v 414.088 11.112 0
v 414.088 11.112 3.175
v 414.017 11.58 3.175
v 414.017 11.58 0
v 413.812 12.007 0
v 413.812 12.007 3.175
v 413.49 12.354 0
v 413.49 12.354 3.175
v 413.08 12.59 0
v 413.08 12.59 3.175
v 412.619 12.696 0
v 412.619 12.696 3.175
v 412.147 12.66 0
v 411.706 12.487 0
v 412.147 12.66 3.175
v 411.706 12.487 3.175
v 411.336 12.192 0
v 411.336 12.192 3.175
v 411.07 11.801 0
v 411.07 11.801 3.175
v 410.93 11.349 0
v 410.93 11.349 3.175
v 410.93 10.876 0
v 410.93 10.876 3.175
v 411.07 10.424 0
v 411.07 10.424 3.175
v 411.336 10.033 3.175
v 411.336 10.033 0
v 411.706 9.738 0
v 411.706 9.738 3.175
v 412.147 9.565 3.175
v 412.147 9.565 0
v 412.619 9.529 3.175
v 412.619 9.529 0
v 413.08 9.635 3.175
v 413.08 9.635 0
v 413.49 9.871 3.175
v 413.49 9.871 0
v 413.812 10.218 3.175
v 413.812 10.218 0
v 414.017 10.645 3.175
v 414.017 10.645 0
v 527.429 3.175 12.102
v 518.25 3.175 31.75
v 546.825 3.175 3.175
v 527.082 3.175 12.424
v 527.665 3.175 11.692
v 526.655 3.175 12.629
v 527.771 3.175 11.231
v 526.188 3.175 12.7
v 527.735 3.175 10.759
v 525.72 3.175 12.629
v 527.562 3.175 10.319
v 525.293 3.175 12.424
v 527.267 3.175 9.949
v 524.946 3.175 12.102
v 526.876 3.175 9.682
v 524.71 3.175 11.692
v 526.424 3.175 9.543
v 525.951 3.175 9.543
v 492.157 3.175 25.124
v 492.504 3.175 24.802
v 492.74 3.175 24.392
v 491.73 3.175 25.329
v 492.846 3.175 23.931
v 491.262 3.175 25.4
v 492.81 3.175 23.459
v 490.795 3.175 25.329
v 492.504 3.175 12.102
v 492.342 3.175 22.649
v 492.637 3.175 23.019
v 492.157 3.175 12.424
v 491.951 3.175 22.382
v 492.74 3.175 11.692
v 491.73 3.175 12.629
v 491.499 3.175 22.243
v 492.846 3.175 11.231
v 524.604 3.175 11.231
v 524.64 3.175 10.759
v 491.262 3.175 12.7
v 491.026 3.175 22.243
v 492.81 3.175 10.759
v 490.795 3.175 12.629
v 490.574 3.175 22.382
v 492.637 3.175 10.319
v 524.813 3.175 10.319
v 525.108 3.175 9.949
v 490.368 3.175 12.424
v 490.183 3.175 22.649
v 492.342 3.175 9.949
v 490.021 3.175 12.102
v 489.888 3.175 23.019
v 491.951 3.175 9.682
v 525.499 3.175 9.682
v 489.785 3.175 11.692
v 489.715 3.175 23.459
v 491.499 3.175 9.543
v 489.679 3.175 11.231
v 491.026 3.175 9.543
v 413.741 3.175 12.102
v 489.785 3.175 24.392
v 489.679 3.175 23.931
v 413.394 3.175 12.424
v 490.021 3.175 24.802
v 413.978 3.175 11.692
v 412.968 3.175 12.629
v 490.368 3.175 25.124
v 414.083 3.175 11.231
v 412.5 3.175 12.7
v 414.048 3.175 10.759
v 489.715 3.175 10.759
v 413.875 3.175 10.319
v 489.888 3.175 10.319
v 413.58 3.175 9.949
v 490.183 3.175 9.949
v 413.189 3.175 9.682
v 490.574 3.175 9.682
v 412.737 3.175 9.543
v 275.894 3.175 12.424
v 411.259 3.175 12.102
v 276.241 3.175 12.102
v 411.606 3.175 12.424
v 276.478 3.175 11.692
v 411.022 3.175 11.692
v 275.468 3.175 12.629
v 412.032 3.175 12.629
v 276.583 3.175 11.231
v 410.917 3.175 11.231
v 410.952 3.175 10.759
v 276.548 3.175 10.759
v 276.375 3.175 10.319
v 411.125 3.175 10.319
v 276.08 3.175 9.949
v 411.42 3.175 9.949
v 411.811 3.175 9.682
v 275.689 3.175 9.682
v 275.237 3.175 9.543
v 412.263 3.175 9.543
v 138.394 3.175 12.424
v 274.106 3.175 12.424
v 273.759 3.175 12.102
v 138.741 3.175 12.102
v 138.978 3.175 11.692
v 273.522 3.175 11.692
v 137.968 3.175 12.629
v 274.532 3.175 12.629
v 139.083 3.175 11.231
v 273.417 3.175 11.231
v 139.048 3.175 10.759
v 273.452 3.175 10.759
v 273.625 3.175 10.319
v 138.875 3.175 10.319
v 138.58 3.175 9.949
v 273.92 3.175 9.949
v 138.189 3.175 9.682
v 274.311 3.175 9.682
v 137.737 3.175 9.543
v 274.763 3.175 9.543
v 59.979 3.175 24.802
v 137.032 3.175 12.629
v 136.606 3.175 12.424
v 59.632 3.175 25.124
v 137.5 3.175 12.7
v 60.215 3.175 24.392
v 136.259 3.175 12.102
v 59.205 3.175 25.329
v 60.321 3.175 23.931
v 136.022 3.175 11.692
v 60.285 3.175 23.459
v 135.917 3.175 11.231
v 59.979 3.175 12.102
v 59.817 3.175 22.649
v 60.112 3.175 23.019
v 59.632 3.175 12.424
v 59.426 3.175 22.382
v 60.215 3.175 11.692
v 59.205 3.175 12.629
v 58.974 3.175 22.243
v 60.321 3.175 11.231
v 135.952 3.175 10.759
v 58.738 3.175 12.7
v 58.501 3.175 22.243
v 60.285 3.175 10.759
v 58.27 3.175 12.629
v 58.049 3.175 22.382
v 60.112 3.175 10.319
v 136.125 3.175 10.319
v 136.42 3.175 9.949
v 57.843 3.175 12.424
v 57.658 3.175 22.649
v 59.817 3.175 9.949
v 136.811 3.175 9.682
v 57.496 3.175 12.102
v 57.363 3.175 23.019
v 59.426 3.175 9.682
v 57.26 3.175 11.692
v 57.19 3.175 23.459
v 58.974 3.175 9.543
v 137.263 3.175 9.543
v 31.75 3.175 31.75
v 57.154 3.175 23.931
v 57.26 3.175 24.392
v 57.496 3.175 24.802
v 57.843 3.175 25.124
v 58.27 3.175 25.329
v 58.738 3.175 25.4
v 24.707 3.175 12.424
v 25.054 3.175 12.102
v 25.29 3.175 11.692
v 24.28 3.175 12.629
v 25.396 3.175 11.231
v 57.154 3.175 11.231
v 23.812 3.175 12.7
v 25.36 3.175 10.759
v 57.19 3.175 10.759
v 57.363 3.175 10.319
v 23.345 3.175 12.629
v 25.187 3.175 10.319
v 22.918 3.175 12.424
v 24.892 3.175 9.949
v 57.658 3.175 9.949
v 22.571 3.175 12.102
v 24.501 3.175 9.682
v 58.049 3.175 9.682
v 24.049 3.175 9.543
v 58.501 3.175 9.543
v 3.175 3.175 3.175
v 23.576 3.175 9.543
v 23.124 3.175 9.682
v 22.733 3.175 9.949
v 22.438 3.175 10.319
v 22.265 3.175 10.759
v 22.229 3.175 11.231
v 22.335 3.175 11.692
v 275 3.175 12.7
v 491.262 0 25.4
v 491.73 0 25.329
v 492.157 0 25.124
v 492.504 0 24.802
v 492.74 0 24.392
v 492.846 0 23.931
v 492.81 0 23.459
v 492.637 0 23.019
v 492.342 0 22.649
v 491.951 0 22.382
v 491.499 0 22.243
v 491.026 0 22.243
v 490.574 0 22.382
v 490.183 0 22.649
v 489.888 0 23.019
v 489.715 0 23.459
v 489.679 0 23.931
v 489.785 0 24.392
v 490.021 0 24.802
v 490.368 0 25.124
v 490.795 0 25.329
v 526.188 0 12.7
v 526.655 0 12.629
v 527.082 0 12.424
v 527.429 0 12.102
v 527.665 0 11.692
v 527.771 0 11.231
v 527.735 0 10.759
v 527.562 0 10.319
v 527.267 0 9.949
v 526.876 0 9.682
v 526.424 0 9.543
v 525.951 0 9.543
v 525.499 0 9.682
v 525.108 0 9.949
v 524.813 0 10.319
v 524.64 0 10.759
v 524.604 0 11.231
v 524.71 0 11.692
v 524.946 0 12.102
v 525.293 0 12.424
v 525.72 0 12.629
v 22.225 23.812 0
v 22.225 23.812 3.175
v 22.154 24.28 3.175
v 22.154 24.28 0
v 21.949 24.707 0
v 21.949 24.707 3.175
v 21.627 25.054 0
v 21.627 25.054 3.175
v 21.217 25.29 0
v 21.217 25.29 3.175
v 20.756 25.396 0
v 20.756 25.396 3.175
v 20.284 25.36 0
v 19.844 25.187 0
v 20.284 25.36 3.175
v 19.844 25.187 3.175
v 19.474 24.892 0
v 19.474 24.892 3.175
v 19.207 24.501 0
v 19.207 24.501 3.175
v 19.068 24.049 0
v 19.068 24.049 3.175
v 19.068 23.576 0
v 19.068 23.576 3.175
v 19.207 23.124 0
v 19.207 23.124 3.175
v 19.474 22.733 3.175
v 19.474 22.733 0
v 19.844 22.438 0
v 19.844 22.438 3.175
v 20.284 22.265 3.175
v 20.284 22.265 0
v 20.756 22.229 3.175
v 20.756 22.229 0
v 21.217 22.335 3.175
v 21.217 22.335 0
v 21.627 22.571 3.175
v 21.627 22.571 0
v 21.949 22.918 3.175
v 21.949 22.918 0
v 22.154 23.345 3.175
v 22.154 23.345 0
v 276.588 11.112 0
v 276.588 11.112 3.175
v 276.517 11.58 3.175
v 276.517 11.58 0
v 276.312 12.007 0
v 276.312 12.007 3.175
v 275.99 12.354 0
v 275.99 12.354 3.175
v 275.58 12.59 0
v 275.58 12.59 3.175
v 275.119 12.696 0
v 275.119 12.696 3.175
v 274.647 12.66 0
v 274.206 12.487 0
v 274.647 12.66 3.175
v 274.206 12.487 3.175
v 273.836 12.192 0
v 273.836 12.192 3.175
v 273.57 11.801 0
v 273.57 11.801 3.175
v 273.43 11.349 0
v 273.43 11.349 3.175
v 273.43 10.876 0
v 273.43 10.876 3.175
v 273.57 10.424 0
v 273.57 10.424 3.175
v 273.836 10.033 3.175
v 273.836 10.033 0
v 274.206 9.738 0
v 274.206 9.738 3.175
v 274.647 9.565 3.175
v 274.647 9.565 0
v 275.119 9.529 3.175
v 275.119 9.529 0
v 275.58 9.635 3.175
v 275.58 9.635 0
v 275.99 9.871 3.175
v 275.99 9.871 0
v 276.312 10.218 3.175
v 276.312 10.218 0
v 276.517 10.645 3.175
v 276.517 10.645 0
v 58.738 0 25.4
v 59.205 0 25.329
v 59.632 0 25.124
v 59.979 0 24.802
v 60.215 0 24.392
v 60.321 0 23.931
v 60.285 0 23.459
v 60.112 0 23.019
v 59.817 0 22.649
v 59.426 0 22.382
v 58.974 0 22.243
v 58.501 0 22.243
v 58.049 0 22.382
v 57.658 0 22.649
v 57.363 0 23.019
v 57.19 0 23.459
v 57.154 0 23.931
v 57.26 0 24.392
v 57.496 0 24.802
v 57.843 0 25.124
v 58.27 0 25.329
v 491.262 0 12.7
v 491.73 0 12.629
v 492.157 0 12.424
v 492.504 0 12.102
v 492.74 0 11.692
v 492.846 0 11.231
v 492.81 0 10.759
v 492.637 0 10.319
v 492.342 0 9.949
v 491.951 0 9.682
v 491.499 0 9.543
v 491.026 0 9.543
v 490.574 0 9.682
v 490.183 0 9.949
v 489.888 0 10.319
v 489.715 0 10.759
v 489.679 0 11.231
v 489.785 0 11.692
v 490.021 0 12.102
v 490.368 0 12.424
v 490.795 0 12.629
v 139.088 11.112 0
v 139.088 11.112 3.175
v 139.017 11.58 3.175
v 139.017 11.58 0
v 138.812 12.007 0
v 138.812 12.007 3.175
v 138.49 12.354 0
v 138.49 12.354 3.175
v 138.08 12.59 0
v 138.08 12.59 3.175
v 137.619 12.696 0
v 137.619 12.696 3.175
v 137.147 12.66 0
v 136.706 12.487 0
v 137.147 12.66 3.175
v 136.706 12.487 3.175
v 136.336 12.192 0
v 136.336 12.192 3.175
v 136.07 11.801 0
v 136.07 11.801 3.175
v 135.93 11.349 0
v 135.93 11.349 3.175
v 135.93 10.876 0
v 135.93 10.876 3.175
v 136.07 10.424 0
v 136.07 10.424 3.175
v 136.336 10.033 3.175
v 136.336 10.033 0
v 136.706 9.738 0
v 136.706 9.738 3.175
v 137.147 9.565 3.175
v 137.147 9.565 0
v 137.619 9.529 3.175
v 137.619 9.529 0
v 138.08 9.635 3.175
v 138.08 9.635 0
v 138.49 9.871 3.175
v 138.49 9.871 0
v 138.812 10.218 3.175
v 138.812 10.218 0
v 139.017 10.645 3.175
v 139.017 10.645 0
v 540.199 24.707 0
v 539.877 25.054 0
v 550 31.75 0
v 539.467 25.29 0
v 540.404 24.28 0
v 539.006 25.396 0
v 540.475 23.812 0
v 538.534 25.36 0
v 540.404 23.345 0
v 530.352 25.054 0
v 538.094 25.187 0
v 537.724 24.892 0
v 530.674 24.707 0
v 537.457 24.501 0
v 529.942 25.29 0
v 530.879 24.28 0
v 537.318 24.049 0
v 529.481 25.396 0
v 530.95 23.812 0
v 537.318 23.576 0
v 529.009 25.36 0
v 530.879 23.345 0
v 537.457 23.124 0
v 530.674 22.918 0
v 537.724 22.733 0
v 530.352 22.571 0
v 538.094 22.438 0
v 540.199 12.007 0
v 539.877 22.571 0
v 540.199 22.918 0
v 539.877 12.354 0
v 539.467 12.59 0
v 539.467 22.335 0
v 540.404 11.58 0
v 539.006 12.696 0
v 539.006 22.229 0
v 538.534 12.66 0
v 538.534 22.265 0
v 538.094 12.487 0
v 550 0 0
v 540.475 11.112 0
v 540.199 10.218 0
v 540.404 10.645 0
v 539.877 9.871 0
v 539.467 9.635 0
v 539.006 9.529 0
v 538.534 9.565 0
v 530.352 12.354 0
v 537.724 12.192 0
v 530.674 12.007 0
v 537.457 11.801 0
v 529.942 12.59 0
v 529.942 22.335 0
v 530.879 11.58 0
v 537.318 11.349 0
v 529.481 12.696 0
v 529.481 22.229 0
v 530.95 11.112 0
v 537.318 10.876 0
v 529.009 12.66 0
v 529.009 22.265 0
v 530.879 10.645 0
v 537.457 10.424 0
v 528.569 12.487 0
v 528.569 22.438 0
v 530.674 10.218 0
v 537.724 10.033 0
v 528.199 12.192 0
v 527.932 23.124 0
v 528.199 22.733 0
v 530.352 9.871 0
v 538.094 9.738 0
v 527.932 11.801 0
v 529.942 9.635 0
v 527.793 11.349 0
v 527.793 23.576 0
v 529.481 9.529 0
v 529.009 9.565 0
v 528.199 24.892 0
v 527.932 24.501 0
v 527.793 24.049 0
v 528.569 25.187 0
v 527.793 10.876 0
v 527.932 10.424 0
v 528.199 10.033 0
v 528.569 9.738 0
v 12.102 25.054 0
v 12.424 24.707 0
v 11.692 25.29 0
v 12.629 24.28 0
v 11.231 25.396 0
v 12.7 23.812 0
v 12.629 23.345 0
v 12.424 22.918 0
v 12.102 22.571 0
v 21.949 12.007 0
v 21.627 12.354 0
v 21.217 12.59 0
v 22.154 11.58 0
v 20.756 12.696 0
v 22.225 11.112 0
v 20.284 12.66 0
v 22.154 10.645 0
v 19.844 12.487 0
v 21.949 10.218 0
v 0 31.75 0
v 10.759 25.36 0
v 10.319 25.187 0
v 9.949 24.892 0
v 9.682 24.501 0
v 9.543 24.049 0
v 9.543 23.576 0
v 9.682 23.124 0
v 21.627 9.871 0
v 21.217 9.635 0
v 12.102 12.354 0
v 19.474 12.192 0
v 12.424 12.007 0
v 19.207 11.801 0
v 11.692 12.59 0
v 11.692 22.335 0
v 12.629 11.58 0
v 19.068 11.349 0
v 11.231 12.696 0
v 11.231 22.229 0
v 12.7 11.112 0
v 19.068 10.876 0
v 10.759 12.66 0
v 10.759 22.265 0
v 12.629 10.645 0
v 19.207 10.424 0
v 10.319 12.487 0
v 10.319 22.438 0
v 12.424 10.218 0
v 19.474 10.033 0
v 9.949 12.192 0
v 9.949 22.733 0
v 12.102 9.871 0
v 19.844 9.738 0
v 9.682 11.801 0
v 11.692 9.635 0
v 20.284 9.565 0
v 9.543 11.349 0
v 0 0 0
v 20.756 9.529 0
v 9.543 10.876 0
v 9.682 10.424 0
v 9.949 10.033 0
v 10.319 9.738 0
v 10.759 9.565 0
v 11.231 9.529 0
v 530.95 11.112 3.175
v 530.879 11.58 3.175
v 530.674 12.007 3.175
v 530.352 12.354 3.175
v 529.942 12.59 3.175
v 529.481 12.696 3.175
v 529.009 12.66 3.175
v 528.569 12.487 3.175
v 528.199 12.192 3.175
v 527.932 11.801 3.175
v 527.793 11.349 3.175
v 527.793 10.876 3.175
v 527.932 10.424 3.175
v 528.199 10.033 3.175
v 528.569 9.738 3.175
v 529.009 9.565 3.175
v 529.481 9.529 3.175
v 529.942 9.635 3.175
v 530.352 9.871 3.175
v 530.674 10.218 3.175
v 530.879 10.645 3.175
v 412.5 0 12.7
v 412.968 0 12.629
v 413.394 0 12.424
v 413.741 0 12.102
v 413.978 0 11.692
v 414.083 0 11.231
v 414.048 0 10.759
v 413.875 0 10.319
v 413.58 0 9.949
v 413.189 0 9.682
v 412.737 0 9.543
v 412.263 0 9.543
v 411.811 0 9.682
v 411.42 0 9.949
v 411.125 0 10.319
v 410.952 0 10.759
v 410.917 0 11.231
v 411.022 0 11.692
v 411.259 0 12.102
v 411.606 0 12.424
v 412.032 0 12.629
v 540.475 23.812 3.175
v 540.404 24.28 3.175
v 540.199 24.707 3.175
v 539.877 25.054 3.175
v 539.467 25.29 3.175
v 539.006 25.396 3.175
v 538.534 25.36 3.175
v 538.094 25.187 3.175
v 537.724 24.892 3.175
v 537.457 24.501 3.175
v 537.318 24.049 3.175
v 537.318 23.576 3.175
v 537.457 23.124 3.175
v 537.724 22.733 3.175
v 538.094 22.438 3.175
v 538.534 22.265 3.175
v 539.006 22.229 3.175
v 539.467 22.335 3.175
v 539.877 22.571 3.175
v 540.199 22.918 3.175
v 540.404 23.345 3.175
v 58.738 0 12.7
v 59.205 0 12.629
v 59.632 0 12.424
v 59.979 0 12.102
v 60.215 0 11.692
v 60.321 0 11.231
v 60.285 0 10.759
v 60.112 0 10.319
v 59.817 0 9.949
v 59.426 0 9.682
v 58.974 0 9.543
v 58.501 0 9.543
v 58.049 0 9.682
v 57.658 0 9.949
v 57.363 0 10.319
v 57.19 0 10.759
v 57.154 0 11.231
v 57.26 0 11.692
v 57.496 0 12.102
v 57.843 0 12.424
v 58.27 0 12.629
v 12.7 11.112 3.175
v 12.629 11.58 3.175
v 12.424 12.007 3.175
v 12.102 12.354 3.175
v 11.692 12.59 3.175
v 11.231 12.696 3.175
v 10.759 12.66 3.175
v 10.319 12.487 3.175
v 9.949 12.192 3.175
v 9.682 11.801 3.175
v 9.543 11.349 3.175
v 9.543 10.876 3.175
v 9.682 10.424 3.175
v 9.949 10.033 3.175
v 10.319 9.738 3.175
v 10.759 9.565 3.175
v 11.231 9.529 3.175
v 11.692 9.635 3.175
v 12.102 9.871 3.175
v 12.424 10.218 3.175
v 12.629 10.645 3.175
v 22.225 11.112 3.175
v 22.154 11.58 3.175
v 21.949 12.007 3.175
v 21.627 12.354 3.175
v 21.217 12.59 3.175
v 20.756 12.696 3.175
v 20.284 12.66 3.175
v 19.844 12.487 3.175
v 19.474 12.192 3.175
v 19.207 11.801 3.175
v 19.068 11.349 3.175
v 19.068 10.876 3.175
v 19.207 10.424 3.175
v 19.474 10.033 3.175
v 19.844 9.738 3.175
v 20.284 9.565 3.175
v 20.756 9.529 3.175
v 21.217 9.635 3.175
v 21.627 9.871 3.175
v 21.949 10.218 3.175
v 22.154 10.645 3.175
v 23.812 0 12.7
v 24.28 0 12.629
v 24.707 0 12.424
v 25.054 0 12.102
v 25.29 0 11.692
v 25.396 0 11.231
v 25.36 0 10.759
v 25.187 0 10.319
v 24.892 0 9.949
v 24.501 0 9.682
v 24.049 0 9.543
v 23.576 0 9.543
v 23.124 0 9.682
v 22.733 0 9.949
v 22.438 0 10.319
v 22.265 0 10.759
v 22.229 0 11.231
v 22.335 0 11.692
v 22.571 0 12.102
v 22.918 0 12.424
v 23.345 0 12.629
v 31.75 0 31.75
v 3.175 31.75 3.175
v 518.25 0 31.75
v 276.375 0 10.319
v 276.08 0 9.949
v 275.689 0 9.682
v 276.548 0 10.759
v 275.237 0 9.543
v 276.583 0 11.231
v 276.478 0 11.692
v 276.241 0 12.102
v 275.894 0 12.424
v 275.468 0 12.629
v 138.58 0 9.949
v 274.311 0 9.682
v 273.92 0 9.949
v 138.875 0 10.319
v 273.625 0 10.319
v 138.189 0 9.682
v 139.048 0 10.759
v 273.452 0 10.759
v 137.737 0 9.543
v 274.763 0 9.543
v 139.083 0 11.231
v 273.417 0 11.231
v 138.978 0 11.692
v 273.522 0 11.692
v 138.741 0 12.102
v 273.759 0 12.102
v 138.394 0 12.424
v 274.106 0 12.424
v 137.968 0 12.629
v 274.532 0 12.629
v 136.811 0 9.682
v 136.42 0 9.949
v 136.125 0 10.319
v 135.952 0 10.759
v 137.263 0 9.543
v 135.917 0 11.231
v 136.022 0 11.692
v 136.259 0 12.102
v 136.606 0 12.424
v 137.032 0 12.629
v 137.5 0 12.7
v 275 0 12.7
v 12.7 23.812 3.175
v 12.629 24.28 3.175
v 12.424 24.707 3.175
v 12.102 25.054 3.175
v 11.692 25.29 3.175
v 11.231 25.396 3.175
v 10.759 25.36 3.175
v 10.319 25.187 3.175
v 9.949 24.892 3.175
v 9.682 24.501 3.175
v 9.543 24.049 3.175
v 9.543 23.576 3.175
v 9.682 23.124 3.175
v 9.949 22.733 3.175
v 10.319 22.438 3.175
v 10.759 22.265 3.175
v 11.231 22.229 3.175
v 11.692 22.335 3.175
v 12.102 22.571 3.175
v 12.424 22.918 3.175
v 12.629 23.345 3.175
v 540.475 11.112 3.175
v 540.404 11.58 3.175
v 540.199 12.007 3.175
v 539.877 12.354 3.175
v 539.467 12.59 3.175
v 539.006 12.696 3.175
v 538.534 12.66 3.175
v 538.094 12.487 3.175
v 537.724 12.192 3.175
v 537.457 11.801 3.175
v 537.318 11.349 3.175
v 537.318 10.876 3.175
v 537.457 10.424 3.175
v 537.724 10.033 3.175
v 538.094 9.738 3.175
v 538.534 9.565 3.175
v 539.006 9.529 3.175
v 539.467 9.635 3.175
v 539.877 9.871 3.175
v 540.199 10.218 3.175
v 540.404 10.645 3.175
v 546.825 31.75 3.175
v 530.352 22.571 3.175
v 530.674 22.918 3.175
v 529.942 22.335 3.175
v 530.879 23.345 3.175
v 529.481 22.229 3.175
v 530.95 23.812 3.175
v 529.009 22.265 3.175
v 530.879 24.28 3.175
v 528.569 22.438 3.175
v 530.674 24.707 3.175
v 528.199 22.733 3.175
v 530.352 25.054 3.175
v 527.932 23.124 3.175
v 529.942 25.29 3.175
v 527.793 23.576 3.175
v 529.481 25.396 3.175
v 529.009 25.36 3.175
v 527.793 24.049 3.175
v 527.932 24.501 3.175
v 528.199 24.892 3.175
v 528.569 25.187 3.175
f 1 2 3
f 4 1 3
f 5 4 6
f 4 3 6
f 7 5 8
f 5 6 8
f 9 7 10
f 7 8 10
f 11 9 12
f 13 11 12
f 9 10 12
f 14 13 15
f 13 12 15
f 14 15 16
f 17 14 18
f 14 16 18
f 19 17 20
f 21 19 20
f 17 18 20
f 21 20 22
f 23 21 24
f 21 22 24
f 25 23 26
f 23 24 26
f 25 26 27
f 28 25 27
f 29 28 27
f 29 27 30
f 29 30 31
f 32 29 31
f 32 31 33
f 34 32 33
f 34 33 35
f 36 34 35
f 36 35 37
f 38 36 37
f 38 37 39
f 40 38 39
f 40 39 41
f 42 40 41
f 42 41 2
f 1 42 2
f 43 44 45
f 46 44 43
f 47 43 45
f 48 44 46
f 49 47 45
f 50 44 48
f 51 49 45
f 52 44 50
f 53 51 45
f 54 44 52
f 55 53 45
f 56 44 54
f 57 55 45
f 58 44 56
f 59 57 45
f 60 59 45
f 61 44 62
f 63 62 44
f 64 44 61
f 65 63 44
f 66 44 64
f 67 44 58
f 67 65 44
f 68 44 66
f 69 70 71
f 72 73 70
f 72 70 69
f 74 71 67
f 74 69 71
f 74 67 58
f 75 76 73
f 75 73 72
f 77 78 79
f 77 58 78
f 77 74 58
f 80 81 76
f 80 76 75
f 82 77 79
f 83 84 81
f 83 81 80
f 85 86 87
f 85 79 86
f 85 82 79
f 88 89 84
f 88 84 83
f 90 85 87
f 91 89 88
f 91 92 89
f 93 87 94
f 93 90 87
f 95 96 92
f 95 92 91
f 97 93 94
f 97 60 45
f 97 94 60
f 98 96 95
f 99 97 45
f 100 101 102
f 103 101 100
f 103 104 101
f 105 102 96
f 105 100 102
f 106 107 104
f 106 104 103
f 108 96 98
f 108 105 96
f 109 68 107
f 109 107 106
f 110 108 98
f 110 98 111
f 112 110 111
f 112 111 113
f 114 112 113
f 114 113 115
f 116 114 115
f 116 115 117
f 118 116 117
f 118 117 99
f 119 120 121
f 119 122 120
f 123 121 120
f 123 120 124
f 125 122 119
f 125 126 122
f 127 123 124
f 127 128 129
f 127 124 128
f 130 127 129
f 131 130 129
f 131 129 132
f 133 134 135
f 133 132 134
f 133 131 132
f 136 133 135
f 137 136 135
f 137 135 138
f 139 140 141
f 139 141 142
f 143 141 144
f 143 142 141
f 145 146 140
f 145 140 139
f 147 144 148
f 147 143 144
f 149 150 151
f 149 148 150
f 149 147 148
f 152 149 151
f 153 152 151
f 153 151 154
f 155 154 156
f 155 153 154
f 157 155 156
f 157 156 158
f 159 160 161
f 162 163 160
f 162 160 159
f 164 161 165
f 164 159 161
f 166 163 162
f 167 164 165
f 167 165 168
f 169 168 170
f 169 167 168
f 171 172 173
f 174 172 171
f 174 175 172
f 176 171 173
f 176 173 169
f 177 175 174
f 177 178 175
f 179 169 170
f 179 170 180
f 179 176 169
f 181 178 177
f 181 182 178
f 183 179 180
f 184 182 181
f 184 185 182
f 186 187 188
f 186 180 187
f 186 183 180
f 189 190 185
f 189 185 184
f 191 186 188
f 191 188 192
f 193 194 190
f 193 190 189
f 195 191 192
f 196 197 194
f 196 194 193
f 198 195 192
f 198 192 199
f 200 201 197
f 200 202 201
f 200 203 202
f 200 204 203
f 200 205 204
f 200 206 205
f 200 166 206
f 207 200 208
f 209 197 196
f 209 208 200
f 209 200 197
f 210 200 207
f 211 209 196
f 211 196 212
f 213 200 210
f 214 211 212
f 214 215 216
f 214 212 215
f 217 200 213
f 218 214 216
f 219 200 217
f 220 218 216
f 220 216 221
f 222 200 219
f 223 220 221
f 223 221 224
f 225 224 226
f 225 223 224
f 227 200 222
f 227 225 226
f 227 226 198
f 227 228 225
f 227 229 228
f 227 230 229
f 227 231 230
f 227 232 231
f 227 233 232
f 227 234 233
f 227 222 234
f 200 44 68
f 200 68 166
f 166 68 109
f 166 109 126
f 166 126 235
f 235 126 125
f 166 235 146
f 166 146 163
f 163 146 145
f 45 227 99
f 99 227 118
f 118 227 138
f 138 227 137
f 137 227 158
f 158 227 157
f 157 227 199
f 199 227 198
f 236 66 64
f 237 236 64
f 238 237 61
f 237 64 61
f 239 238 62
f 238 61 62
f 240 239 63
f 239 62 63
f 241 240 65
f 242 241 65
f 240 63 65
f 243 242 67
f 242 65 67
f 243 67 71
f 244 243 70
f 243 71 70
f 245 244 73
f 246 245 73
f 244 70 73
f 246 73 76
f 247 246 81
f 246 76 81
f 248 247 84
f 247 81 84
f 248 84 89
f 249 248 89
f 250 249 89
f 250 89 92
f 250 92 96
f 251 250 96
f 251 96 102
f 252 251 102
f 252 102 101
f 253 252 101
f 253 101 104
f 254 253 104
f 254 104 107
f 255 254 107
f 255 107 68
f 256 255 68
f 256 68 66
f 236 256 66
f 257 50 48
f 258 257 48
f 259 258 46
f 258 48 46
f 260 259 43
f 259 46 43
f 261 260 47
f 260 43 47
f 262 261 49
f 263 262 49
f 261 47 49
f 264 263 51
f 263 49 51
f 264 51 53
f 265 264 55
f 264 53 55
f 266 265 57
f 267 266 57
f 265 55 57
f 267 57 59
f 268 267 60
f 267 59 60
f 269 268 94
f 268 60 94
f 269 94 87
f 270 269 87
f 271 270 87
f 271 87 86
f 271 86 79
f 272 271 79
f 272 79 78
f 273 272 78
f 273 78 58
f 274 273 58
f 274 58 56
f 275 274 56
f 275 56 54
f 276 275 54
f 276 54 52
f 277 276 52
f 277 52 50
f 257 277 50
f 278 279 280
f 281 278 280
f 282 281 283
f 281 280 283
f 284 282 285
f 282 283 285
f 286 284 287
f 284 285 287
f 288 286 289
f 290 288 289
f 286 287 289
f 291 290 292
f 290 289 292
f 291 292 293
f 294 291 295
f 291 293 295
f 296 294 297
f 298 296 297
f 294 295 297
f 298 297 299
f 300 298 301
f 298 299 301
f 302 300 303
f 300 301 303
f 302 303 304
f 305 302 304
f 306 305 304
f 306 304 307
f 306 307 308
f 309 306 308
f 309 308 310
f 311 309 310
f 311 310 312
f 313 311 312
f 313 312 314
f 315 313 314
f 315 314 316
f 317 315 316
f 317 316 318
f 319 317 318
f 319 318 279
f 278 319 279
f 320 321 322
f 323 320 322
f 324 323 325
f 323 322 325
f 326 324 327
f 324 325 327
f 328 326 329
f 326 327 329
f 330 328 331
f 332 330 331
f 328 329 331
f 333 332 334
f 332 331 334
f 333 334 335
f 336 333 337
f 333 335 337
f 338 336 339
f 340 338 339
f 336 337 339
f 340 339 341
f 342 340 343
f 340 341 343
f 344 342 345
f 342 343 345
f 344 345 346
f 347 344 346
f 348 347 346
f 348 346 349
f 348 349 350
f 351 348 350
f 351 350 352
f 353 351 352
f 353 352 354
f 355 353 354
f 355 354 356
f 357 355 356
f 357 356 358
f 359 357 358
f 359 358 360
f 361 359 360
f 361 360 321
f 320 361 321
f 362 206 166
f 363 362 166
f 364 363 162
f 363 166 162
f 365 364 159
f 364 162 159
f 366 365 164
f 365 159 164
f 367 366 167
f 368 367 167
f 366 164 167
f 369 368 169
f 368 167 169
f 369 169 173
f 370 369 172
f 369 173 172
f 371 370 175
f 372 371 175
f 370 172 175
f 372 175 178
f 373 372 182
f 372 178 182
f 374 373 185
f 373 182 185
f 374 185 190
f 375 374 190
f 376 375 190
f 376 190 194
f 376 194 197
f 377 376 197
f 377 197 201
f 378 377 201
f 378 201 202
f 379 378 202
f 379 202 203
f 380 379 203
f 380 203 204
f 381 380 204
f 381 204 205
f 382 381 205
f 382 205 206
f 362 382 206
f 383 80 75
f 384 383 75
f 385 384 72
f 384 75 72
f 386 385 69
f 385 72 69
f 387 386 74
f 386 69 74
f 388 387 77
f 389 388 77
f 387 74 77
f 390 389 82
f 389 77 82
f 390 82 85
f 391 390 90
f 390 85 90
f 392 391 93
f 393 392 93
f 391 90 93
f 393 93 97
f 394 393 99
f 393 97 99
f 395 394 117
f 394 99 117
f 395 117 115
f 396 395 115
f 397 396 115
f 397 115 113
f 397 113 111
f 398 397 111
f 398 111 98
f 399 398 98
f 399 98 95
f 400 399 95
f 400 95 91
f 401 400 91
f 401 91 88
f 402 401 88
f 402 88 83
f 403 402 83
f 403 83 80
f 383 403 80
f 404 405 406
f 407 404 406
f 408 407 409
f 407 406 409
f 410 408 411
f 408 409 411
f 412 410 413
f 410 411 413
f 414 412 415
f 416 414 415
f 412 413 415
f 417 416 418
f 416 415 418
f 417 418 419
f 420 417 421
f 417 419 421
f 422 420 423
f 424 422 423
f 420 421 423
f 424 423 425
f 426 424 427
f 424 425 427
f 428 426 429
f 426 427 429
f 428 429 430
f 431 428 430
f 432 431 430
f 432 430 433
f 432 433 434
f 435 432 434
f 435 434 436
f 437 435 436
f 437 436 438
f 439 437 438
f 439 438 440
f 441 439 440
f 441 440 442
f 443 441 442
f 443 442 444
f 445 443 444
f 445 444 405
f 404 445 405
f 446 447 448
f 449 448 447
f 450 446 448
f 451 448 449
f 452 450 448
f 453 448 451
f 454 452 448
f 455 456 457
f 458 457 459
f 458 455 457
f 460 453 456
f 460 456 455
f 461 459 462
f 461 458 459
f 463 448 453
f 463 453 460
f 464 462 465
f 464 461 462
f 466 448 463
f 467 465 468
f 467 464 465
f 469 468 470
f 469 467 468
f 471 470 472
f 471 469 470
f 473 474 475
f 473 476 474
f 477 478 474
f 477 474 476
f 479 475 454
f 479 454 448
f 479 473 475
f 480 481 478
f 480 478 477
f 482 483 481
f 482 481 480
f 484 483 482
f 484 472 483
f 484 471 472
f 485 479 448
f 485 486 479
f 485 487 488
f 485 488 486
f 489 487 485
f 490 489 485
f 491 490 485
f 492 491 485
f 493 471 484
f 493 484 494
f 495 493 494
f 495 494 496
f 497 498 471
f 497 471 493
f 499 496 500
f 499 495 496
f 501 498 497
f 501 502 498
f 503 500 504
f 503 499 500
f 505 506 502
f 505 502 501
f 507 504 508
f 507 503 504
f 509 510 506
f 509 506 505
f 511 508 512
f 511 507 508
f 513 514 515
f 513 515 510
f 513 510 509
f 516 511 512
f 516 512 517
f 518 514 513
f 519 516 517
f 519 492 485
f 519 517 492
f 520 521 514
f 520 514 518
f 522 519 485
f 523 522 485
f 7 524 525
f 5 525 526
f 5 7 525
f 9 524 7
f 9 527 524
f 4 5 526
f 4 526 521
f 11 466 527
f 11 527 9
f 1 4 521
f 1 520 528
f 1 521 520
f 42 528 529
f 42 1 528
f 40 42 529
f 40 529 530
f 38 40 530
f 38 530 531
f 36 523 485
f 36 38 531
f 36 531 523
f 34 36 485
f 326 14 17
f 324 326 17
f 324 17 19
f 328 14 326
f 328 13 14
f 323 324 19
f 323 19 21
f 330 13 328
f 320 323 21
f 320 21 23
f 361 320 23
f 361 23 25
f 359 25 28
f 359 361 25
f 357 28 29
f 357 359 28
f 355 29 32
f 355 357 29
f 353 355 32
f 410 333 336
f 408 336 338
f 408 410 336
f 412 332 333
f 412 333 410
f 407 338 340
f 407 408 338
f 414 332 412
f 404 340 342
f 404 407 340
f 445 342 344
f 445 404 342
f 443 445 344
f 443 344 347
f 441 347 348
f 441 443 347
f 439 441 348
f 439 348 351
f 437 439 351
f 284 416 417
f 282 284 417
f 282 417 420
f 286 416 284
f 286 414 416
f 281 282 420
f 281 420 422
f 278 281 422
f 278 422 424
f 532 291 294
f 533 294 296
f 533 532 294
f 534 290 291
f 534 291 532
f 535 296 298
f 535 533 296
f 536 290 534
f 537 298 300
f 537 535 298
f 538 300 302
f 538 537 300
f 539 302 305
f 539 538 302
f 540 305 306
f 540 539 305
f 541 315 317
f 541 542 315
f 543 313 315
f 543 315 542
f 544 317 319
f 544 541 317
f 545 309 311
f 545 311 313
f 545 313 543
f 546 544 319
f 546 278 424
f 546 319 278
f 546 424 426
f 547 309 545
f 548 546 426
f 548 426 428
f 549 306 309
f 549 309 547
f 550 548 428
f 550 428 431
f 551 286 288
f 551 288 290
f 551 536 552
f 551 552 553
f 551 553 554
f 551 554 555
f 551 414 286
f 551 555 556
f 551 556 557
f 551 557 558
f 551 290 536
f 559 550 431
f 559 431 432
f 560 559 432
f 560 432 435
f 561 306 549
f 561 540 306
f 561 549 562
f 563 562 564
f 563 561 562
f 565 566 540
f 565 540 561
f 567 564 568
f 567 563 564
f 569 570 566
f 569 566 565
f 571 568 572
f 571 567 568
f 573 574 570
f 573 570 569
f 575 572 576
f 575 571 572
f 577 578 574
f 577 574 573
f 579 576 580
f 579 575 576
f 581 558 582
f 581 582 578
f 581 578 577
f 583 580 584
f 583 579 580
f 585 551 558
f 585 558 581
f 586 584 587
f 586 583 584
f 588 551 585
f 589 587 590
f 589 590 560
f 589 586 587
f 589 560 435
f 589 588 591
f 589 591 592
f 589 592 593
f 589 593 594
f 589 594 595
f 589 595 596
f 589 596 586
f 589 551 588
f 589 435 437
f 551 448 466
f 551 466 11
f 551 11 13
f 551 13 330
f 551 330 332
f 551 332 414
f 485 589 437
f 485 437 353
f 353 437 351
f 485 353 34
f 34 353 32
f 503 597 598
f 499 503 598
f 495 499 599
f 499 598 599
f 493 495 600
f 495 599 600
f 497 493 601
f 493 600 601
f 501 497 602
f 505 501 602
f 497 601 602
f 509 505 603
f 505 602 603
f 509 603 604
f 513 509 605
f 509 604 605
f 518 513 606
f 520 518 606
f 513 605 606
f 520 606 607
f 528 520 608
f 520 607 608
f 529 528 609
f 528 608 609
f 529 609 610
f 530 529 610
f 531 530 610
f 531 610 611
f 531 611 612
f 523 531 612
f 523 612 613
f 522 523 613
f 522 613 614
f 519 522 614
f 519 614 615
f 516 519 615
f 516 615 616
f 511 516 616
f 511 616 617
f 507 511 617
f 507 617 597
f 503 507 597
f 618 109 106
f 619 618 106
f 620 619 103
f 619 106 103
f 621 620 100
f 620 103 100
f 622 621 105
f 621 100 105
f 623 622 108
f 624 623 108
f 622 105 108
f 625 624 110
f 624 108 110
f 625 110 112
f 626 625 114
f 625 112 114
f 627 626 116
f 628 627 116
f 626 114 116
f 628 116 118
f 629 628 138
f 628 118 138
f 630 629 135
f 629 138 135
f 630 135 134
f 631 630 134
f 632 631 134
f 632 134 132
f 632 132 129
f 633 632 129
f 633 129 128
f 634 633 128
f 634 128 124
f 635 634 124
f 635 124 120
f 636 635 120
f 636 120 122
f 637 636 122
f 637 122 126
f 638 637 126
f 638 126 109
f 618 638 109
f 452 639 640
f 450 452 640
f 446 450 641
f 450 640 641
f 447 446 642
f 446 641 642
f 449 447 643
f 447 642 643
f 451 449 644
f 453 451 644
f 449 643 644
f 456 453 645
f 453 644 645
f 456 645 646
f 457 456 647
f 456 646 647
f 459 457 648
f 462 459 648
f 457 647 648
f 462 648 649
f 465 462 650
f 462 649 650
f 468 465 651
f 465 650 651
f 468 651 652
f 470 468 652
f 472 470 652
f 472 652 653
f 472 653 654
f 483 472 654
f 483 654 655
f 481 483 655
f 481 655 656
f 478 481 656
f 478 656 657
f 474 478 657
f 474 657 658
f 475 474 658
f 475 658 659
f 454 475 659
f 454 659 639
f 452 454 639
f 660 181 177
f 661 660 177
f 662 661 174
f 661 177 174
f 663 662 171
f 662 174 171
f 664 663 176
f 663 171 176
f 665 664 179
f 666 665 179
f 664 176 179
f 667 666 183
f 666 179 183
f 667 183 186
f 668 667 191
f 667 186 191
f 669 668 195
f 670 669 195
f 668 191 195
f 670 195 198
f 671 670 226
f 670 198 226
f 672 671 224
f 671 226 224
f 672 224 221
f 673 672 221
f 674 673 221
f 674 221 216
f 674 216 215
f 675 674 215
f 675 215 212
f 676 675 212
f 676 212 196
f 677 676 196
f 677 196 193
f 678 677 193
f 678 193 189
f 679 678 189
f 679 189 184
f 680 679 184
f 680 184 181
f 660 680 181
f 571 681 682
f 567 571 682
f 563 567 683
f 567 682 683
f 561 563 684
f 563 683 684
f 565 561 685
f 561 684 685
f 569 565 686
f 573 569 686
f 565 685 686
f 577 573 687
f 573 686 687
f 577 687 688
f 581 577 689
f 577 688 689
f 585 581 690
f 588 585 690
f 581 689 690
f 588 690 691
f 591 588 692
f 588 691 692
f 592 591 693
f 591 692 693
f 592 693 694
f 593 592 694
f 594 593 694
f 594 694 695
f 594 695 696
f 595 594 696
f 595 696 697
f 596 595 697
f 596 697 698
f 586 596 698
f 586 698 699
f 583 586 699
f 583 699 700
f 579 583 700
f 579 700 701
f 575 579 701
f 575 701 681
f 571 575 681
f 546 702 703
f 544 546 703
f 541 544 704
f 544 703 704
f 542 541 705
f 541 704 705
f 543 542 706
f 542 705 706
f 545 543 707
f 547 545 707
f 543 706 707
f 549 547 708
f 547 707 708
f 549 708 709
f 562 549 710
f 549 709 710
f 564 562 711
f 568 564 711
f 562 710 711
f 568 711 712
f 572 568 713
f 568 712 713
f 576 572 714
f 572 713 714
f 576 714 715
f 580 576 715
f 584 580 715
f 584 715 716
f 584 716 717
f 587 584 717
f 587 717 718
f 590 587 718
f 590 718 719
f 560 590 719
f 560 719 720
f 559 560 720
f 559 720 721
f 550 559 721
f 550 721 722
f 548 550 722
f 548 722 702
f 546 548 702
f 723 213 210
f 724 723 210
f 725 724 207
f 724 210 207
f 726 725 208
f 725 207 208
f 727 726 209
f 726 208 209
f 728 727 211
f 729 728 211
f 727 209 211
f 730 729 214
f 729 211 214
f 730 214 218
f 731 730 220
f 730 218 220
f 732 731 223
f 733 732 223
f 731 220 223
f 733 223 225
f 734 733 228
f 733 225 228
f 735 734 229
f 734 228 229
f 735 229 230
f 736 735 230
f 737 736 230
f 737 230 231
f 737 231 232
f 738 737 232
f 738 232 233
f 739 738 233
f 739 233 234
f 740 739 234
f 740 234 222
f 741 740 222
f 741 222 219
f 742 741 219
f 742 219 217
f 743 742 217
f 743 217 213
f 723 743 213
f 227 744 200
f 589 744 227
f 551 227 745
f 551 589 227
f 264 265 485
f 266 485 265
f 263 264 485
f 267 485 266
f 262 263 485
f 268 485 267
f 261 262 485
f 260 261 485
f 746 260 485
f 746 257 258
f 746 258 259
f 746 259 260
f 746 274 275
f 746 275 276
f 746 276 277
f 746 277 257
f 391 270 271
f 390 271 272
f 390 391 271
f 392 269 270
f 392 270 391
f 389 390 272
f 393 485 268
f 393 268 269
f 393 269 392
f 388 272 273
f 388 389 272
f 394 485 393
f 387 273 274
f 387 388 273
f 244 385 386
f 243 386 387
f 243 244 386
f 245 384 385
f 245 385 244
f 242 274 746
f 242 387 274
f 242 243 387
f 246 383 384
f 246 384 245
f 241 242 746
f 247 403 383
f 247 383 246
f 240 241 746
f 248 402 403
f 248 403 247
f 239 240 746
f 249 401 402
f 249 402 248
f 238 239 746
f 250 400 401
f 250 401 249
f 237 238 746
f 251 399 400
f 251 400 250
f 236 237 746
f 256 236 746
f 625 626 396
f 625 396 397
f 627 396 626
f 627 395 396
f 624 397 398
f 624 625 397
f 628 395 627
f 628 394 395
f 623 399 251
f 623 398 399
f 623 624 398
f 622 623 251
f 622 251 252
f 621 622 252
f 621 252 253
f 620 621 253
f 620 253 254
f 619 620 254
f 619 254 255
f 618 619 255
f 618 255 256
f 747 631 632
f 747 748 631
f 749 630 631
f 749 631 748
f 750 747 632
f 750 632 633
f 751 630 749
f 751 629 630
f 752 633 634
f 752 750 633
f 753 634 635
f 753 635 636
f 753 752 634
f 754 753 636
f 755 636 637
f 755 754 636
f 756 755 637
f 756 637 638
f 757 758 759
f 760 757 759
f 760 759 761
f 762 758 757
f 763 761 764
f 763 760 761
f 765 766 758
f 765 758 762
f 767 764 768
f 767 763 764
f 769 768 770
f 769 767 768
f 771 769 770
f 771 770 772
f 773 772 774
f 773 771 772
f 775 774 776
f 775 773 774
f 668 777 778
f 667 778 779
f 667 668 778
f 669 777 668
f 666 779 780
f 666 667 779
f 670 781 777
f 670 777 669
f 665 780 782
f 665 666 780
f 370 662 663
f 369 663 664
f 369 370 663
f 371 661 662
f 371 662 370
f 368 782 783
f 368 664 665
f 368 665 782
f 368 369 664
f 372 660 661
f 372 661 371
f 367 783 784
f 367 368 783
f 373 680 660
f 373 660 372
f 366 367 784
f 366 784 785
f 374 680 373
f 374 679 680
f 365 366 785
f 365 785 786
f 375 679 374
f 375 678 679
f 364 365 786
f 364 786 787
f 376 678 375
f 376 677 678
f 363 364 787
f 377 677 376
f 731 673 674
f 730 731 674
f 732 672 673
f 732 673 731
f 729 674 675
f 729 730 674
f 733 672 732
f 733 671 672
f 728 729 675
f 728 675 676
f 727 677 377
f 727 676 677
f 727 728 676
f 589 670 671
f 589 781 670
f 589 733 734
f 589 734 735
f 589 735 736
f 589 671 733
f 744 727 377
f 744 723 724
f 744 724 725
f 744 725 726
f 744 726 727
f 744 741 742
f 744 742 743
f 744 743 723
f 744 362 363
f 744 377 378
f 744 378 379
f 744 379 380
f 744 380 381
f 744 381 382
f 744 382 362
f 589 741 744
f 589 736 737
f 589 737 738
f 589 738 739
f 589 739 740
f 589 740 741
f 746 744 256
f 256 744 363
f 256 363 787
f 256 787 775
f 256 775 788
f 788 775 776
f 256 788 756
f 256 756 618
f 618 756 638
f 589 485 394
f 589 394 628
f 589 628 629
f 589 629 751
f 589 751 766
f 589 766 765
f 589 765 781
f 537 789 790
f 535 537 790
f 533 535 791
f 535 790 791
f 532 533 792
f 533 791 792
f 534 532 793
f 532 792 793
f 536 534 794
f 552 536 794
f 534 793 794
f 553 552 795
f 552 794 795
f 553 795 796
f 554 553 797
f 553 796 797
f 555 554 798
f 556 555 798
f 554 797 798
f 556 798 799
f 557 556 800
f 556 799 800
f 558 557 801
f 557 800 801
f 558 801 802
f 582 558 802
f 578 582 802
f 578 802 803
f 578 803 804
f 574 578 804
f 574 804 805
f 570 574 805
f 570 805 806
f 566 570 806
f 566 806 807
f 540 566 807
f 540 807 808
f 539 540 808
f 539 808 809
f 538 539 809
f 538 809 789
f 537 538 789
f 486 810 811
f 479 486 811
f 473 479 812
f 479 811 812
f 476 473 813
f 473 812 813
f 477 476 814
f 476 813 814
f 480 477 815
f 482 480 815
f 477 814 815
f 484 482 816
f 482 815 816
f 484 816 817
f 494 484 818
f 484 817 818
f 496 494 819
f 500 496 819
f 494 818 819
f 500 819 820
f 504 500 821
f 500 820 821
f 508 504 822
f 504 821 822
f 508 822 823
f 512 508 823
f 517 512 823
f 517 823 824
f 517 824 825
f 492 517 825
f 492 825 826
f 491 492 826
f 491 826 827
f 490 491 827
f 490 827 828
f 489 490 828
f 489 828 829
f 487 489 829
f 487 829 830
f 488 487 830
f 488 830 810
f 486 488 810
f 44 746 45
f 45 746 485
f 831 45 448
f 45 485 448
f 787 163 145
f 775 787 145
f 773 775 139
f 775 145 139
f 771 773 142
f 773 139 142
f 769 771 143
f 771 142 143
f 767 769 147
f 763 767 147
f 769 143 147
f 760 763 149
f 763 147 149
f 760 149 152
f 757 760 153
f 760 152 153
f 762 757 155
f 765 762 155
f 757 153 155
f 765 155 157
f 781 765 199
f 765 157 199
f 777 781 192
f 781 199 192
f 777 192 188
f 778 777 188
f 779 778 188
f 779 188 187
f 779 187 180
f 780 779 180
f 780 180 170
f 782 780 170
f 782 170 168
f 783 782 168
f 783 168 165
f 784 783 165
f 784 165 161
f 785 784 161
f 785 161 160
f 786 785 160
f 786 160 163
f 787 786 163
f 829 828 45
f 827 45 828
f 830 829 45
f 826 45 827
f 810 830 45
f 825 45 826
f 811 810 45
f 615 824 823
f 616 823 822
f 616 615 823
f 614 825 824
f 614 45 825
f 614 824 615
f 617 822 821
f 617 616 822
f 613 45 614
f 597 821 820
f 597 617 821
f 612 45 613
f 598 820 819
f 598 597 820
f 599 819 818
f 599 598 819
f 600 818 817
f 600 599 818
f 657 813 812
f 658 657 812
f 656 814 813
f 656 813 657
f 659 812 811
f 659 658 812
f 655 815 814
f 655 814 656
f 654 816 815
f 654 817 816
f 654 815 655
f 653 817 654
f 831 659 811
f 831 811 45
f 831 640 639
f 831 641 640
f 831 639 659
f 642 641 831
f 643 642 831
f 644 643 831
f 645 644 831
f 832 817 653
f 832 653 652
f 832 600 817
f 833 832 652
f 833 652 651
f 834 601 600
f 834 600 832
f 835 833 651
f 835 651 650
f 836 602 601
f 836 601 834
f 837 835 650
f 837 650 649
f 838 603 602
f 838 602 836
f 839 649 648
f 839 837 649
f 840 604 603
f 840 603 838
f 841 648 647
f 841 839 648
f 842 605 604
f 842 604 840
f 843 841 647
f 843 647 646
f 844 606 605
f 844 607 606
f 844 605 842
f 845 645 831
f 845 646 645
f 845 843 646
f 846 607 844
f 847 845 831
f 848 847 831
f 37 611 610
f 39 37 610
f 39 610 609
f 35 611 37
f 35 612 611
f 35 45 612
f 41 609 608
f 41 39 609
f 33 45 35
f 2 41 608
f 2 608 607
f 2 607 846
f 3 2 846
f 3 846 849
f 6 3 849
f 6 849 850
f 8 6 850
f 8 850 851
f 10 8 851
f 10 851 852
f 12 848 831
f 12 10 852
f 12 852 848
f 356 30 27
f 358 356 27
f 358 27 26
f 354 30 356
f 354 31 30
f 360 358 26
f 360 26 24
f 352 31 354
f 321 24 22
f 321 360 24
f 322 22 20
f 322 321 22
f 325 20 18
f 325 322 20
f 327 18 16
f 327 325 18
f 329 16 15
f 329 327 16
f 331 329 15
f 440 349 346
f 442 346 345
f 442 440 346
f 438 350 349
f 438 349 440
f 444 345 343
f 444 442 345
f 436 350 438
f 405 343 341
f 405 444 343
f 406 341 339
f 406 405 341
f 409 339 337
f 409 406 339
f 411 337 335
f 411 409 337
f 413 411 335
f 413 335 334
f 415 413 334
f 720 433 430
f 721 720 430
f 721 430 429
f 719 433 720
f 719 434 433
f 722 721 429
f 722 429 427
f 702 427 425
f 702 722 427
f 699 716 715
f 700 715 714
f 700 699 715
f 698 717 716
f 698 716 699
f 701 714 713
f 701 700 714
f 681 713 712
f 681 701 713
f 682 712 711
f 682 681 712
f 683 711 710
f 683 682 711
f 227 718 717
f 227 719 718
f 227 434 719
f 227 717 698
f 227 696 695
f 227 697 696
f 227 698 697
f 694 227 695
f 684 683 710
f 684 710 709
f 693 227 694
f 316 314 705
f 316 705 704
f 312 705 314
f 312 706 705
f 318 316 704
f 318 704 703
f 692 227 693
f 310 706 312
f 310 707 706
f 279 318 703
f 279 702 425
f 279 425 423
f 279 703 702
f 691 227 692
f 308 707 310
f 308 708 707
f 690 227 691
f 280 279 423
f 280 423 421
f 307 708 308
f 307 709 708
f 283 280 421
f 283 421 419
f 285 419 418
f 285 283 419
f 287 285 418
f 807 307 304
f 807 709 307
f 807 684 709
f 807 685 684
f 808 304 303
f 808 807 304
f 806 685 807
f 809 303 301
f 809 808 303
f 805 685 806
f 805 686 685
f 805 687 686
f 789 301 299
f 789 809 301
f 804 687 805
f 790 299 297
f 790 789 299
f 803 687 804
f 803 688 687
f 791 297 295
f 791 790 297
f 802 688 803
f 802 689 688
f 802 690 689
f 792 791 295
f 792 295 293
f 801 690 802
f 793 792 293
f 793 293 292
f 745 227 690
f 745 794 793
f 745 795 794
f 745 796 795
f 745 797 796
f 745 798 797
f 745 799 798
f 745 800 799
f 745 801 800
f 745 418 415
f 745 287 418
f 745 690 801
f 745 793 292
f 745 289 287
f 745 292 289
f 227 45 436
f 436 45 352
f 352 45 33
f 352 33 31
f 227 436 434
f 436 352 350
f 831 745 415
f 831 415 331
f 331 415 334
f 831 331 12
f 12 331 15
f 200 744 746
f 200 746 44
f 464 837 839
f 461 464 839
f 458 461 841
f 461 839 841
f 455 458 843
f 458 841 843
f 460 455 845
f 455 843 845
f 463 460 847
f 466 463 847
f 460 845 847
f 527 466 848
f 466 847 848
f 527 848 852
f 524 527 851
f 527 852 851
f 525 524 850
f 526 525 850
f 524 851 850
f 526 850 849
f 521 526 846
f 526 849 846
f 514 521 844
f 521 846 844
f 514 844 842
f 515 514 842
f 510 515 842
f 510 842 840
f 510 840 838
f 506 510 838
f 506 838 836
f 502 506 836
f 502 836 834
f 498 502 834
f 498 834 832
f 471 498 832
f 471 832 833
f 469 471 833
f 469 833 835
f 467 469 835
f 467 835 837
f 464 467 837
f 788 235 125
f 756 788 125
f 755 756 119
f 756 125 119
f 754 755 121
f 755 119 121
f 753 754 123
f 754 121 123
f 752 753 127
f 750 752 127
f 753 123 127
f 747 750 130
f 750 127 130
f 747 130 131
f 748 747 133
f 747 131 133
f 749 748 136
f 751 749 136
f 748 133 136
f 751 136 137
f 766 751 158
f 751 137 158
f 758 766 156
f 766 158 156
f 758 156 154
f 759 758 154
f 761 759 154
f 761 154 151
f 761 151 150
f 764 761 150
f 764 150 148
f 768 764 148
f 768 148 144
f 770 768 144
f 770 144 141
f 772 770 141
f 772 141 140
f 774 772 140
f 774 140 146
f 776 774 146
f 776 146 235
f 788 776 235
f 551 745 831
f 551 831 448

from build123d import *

# Parameters (mm, degrees)
BOSS_EXTRUDE1_DEPTH          = 550
CHAMFER6_SIZE                = 31.75
CHAMFER7_SIZE                = 31.75
TOPHOLES_SKETCH3_R           = 1.5875
TOPHOLES_CUT_EXTRUDE2_DEPTH  = 552.656227306
SIDEHOLES_SKETCH4_R          = 1.5875
SIDEHOLES_CUT_EXTRUDE3_DEPTH = 552.656227306


with BuildPart() as part:
    # Sketch1 → Boss-Extrude1 (new body)
    with BuildSketch(Plane(origin=(0, 0, 0), x_dir=(0, 0, -1), z_dir=(1, 0, 0))):
        Polygon((0, 0), (-31.75, 0), (-31.75, 3.175), (-3.175, 3.175), (-3.175, 31.75), (0, 31.75), align=None)
    extrude(amount=BOSS_EXTRUDE1_DEPTH)

    # Chamfer6
    chamfer6_edges = [part.edges().sort_by_distance(p)[0] for p in [
        (550, 1.5875, 31.75),
    ]]
    chamfer(chamfer6_edges, length=CHAMFER6_SIZE - 0.0001)  # a hair under: the kernel refuses the full size

    # Chamfer7
    chamfer7_edges = [part.edges().sort_by_distance(p)[0] for p in [
        (0, 1.5875, 31.75),
    ]]
    chamfer(chamfer7_edges, length=CHAMFER7_SIZE - 0.0001)  # a hair under: the kernel refuses the full size

    # TopHoles-Sketch3 → TopHoles-Cut-Extrude2 (cut, through all)
    with BuildSketch(Plane(origin=(0, 3.175, 0), x_dir=(1, 0, 0), z_dir=(0, 1, 0))):
        with Locations(Location((58.7375, -23.8125, 0), (0, 0, 270))):
            Circle(TOPHOLES_SKETCH3_R)
        with Locations(Location((491.2625, -23.8125, 0), (0, 0, 270))):
            Circle(TOPHOLES_SKETCH3_R)
        with Locations(Location((491.2625, -11.1125, 0), (0, 0, 270))):
            Circle(TOPHOLES_SKETCH3_R)
        with Locations(Location((58.7375, -11.1125, 0), (0, 0, 270))):
            Circle(TOPHOLES_SKETCH3_R)
        with Locations(Location((526.1875, -11.1125, 0), (0, 0, 270))):
            Circle(TOPHOLES_SKETCH3_R)
        with Locations(Location((23.8125, -11.1125, 0), (0, 0, 270))):
            Circle(TOPHOLES_SKETCH3_R)
        with Locations(Location((275, -11.1125, 0), (0, 0, 270))):
            Circle(TOPHOLES_SKETCH3_R)
        with Locations(Location((137.5, -11.1125, 0), (0, 0, 270))):
            Circle(TOPHOLES_SKETCH3_R)
        with Locations(Location((412.5, -11.1125, 0), (0, 0, 270))):
            Circle(TOPHOLES_SKETCH3_R)
    extrude(amount=-TOPHOLES_CUT_EXTRUDE2_DEPTH, mode=Mode.SUBTRACT)

    # SideHoles-Sketch4 → SideHoles-Cut-Extrude3 (cut, through all)
    with BuildSketch(Plane.XY.offset(3.175)):
        with Locations((11.1125, 23.8125)):
            Circle(SIDEHOLES_SKETCH4_R)
        with Locations((529.3625, 23.8125)):
            Circle(SIDEHOLES_SKETCH4_R)
        with Locations((20.6375, 23.8125)):
            Circle(SIDEHOLES_SKETCH4_R)
        with Locations((538.8875, 23.8125)):
            Circle(SIDEHOLES_SKETCH4_R)
        with Locations((11.1125, 11.1125)):
            Circle(SIDEHOLES_SKETCH4_R)
        with Locations((20.6375, 11.1125)):
            Circle(SIDEHOLES_SKETCH4_R)
        with Locations((529.3625, 11.1125)):
            Circle(SIDEHOLES_SKETCH4_R)
        with Locations((538.8875, 11.1125)):
            Circle(SIDEHOLES_SKETCH4_R)
        with Locations((137.5, 11.1125)):
            Circle(SIDEHOLES_SKETCH4_R)
        with Locations((275, 11.1125)):
            Circle(SIDEHOLES_SKETCH4_R)
        with Locations((412.5, 11.1125)):
            Circle(SIDEHOLES_SKETCH4_R)
    extrude(amount=-SIDEHOLES_CUT_EXTRUDE3_DEPTH, mode=Mode.SUBTRACT)


solid = part.part
